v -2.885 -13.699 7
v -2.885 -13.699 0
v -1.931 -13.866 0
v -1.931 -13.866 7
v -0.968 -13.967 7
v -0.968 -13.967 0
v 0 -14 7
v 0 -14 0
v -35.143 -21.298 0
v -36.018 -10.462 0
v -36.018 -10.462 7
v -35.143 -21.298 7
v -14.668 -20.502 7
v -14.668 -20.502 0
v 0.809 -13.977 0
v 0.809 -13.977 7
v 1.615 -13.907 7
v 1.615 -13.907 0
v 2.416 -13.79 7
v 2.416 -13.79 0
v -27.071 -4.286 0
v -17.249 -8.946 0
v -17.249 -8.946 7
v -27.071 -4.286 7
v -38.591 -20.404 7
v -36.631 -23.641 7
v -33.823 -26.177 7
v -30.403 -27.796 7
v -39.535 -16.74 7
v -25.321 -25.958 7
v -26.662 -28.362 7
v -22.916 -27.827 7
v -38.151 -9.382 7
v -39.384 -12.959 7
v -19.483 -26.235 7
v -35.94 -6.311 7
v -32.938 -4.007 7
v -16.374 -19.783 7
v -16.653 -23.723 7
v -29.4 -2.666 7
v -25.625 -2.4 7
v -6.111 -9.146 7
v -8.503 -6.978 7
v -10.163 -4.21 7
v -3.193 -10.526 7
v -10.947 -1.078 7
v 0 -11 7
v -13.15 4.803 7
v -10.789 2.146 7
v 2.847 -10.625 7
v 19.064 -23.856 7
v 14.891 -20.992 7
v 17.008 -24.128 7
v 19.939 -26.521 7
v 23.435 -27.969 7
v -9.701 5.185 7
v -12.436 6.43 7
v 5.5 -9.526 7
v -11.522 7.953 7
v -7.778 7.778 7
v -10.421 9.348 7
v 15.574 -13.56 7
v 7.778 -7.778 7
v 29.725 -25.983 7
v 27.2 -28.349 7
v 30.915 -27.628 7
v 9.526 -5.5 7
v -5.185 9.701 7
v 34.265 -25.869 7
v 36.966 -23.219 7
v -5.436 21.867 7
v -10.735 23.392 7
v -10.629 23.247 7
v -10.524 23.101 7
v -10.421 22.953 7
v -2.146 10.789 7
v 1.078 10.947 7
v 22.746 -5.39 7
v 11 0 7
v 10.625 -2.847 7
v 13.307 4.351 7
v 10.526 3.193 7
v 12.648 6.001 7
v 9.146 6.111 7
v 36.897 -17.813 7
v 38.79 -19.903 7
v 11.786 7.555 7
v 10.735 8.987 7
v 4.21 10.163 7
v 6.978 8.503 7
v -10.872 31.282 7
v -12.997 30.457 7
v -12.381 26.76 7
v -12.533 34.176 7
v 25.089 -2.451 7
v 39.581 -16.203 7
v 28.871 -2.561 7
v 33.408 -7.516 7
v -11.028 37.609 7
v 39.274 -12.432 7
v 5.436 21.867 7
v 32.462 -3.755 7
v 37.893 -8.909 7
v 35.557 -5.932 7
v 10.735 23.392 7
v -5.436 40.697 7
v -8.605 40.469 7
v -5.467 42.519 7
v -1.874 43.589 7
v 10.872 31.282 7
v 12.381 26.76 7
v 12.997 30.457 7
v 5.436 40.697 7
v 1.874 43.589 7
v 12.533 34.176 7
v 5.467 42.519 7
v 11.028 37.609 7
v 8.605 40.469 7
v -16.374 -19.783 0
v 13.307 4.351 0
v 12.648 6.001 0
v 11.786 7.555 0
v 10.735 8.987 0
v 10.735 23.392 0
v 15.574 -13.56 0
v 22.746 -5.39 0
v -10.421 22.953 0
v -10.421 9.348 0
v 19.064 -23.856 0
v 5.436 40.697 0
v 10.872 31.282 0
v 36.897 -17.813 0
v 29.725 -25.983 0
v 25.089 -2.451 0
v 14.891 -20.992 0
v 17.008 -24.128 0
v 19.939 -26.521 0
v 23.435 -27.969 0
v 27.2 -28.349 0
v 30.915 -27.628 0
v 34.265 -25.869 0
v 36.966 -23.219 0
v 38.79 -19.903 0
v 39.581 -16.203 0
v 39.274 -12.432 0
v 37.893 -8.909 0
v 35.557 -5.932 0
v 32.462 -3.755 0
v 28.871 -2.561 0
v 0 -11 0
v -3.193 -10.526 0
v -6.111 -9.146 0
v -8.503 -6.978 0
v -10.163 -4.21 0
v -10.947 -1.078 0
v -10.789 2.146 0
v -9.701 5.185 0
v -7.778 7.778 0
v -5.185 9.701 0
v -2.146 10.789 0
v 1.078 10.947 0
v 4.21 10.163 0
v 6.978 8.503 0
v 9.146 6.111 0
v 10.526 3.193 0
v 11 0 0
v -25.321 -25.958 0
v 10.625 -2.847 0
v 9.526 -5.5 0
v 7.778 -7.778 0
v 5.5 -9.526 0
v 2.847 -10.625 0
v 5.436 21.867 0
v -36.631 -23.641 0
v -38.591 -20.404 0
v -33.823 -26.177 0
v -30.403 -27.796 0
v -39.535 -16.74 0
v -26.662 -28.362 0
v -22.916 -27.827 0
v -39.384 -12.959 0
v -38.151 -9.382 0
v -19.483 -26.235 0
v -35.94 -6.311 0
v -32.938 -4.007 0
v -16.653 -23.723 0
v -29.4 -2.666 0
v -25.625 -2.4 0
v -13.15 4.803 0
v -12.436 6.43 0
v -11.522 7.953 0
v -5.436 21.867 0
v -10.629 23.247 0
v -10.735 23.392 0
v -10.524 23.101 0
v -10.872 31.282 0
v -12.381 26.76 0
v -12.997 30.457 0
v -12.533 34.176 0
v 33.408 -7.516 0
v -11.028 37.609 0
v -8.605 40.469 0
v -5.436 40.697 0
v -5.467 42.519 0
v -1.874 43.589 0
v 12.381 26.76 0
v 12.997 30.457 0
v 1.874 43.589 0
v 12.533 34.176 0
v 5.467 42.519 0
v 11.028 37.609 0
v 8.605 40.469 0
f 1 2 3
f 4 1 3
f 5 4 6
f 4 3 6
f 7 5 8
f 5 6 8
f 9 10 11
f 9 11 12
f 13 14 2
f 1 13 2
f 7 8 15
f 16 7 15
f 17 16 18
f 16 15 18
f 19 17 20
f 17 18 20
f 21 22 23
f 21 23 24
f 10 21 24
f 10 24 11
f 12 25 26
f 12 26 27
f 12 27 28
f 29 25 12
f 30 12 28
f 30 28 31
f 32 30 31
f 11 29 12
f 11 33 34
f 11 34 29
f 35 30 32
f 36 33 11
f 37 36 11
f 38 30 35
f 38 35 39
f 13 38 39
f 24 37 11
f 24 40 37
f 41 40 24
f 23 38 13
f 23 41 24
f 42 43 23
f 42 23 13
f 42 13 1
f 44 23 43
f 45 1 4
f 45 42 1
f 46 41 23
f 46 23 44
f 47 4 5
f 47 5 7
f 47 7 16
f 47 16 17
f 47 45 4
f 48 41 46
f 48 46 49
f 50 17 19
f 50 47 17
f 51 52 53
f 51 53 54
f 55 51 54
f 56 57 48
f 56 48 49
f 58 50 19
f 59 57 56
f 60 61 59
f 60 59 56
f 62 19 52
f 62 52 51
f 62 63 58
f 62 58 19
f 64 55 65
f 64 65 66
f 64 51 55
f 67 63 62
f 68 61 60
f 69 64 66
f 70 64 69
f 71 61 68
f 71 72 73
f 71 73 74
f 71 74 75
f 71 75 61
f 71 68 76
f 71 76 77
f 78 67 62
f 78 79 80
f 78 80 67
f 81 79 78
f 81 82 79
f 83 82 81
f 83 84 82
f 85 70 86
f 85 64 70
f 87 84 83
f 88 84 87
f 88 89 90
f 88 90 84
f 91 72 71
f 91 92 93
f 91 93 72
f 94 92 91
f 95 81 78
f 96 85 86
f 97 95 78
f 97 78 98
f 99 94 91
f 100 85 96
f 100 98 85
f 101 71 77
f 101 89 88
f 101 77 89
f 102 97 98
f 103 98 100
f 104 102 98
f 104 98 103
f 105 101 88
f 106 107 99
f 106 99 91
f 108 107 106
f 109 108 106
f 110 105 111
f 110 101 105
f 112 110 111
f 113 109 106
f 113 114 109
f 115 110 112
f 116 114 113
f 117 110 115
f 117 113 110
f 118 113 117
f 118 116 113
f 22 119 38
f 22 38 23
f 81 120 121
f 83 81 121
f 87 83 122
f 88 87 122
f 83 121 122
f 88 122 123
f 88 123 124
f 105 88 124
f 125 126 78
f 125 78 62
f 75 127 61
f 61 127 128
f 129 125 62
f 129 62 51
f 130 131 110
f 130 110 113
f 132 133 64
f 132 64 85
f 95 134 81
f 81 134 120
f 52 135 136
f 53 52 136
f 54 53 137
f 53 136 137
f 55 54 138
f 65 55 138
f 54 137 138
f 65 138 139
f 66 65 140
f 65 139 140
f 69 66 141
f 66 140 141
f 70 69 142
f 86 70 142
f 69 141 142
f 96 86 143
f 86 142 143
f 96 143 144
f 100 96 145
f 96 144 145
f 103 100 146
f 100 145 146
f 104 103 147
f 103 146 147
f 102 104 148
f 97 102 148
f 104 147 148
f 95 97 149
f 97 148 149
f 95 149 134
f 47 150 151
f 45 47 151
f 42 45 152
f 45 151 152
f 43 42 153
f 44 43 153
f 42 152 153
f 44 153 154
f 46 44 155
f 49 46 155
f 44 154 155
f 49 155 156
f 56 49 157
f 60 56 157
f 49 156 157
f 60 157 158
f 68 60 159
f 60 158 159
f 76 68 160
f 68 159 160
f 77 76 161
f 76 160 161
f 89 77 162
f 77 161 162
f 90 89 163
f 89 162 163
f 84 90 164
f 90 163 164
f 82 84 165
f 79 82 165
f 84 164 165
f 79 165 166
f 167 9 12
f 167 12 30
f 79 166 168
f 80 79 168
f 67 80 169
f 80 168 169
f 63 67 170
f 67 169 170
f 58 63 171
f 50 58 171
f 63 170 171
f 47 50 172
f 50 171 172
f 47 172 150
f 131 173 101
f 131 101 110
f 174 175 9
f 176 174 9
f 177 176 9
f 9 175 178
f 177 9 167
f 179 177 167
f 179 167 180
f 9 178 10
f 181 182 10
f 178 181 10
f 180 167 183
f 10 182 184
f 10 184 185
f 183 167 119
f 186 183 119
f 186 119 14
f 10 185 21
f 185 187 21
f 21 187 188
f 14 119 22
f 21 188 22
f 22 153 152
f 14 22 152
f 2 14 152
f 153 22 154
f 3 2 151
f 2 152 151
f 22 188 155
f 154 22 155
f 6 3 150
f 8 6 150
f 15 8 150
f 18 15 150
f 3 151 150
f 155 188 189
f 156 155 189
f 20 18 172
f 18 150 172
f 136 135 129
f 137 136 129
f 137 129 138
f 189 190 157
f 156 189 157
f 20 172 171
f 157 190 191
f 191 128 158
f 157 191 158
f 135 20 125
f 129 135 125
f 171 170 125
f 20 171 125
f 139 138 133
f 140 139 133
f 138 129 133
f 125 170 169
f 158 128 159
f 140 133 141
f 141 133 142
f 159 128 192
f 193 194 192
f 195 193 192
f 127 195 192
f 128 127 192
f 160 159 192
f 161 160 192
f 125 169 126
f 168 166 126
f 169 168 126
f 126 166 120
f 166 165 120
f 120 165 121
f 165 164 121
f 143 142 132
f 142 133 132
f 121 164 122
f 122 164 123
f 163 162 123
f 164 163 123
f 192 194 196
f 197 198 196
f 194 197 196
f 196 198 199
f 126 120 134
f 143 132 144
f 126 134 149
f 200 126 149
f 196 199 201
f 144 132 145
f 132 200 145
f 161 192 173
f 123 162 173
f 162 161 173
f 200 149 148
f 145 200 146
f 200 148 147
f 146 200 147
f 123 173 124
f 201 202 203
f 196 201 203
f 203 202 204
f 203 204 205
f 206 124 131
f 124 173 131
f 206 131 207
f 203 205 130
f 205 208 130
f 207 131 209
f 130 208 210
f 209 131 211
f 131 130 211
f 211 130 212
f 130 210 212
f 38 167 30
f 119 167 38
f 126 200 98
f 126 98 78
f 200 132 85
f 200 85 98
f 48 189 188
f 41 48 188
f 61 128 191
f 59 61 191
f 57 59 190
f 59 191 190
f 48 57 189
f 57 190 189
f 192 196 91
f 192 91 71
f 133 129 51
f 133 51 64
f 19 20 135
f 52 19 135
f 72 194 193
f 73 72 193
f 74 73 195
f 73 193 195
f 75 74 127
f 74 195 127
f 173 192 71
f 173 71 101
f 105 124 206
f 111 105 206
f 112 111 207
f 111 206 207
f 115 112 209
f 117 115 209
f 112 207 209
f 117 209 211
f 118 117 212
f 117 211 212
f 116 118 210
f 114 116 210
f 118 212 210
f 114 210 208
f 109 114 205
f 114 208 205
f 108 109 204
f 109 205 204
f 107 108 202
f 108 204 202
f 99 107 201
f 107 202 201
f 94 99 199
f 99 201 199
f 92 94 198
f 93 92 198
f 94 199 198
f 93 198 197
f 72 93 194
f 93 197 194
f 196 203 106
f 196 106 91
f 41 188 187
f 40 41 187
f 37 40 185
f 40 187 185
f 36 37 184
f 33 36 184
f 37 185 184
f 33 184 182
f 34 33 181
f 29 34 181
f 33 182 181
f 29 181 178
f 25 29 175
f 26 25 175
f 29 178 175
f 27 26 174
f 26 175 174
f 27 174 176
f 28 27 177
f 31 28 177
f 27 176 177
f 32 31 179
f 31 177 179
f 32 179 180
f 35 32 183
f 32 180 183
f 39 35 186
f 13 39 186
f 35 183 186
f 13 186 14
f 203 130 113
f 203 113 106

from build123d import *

# Parameters (mm, degrees)
F1_DEPTH  = 7
F1_FACE_R = 11
F3_DEPTH  = 45.5


with BuildPart() as f1:
    # F0 (on Top) → F1 (new body)
    with BuildSketch(Plane.XY):
        with BuildLine():
            ThreePointArc((-2.885217, -13.699472), (-1.450413, -13.924665), (0, -14))
            ThreePointArc((0, -14), (1.212509, -13.947395), (2.415907, -13.789974))
            Line((2.415907, -13.789974), (14.89071, -20.992305))
            ThreePointArc((14.89071, -20.992305), (37.998969, -21.627676), (25.088992, -2.451445))
            Line((25.088992, -2.451445), (13.306699, 4.351065))
            ThreePointArc((13.306699, 4.351065), (12.242078, 6.792019), (10.734515, 8.987224))
            Line((10.734515, 8.987224), (10.734515, 23.391886))
            ThreePointArc((10.734515, 23.391886), (0, 43.724702), (-10.734515, 23.391886))
            ThreePointArc((-10.734515, 23.391886), (-10.576305, 23.173866), (-10.421482, 22.953427))
            Line((-10.421482, 22.953427), (-10.421482, 9.348407))
            ThreePointArc((-10.421482, 9.348407), (-12.0031, 7.205941), (-13.150422, 4.802751))
            Line((-13.150422, 4.802751), (-25.625225, -2.39958))
            ThreePointArc((-25.625225, -2.39958), (-37.729602, -22.094234), (-14.66751, -20.501982))
            Line((-14.66751, -20.501982), (-2.885217, -13.699472))
        make_face()
        with BuildLine():
            ThreePointArc((0, -11), (-7.778175, 7.778175), (11, 0))
            ThreePointArc((11, 0), (7.778175, -7.778175), (0, -11))
        make_face(mode=Mode.SUBTRACT)
    extrude(amount=F1_DEPTH)

    # F2 (on Top) + F1_face (on face) → F3 (cut)
    with BuildSketch(Plane.XY):
        Polygon((-25.32137, -25.958319), (-16.374294, -19.782603), (-17.249084, -8.94635), (-27.070949, -4.285813), (-36.018025, -10.46153), (-35.143235, -21.297783), align=None)
        Polygon((36.897277, -17.812624), (33.407967, -7.516298), (22.746431, -5.389966), (15.574206, -13.559961), (19.063516, -23.856288), (29.725052, -25.98262), align=None)
        Polygon((5.435753, 40.696717), (-5.435753, 40.696717), (-10.871506, 31.281717), (-5.435753, 21.866717), (5.435753, 21.866717), (10.871506, 31.281717), align=None)
    with BuildSketch(Plane(origin=(8e-06, -1.8e-05, 7), x_dir=(1, 0, 0), z_dir=(0, 0, 1))):
        with BuildLine():
            Line((-14.667518, -20.501964), (-2.885225, -13.699454))
            ThreePointArc((-2.885225, -13.699454), (-0.238987, -13.997942), (2.415899, -13.789957))
            Line((2.415899, -13.789957), (14.890702, -20.992287))
            ThreePointArc((14.890702, -20.992287), (37.998961, -21.627658), (25.088984, -2.451427))
            Line((25.088984, -2.451427), (13.306691, 4.351083))
            ThreePointArc((13.306691, 4.351083), (12.24207, 6.792037), (10.734507, 8.987242))
            Line((10.734507, 8.987242), (10.734507, 23.391904))
            ThreePointArc((10.734507, 23.391904), (-8e-06, 43.72472), (-10.734523, 23.391904))
            ThreePointArc((-10.734523, 23.391904), (-10.576313, 23.173884), (-10.42149, 22.953445))
            Line((-10.42149, 22.953445), (-10.42149, 9.348425))
            ThreePointArc((-10.42149, 9.348425), (-12.003108, 7.205959), (-13.15043, 4.802769))
            Line((-13.15043, 4.802769), (-25.625233, -2.399562))
            ThreePointArc((-25.625233, -2.399562), (-37.72961, -22.094217), (-14.667518, -20.501964))
        make_face()
        with Locations((-8e-06, 1.8e-05)):
            Circle(F1_FACE_R, mode=Mode.SUBTRACT)
    extrude(amount=F3_DEPTH, mode=Mode.SUBTRACT)


solid = f1.part
